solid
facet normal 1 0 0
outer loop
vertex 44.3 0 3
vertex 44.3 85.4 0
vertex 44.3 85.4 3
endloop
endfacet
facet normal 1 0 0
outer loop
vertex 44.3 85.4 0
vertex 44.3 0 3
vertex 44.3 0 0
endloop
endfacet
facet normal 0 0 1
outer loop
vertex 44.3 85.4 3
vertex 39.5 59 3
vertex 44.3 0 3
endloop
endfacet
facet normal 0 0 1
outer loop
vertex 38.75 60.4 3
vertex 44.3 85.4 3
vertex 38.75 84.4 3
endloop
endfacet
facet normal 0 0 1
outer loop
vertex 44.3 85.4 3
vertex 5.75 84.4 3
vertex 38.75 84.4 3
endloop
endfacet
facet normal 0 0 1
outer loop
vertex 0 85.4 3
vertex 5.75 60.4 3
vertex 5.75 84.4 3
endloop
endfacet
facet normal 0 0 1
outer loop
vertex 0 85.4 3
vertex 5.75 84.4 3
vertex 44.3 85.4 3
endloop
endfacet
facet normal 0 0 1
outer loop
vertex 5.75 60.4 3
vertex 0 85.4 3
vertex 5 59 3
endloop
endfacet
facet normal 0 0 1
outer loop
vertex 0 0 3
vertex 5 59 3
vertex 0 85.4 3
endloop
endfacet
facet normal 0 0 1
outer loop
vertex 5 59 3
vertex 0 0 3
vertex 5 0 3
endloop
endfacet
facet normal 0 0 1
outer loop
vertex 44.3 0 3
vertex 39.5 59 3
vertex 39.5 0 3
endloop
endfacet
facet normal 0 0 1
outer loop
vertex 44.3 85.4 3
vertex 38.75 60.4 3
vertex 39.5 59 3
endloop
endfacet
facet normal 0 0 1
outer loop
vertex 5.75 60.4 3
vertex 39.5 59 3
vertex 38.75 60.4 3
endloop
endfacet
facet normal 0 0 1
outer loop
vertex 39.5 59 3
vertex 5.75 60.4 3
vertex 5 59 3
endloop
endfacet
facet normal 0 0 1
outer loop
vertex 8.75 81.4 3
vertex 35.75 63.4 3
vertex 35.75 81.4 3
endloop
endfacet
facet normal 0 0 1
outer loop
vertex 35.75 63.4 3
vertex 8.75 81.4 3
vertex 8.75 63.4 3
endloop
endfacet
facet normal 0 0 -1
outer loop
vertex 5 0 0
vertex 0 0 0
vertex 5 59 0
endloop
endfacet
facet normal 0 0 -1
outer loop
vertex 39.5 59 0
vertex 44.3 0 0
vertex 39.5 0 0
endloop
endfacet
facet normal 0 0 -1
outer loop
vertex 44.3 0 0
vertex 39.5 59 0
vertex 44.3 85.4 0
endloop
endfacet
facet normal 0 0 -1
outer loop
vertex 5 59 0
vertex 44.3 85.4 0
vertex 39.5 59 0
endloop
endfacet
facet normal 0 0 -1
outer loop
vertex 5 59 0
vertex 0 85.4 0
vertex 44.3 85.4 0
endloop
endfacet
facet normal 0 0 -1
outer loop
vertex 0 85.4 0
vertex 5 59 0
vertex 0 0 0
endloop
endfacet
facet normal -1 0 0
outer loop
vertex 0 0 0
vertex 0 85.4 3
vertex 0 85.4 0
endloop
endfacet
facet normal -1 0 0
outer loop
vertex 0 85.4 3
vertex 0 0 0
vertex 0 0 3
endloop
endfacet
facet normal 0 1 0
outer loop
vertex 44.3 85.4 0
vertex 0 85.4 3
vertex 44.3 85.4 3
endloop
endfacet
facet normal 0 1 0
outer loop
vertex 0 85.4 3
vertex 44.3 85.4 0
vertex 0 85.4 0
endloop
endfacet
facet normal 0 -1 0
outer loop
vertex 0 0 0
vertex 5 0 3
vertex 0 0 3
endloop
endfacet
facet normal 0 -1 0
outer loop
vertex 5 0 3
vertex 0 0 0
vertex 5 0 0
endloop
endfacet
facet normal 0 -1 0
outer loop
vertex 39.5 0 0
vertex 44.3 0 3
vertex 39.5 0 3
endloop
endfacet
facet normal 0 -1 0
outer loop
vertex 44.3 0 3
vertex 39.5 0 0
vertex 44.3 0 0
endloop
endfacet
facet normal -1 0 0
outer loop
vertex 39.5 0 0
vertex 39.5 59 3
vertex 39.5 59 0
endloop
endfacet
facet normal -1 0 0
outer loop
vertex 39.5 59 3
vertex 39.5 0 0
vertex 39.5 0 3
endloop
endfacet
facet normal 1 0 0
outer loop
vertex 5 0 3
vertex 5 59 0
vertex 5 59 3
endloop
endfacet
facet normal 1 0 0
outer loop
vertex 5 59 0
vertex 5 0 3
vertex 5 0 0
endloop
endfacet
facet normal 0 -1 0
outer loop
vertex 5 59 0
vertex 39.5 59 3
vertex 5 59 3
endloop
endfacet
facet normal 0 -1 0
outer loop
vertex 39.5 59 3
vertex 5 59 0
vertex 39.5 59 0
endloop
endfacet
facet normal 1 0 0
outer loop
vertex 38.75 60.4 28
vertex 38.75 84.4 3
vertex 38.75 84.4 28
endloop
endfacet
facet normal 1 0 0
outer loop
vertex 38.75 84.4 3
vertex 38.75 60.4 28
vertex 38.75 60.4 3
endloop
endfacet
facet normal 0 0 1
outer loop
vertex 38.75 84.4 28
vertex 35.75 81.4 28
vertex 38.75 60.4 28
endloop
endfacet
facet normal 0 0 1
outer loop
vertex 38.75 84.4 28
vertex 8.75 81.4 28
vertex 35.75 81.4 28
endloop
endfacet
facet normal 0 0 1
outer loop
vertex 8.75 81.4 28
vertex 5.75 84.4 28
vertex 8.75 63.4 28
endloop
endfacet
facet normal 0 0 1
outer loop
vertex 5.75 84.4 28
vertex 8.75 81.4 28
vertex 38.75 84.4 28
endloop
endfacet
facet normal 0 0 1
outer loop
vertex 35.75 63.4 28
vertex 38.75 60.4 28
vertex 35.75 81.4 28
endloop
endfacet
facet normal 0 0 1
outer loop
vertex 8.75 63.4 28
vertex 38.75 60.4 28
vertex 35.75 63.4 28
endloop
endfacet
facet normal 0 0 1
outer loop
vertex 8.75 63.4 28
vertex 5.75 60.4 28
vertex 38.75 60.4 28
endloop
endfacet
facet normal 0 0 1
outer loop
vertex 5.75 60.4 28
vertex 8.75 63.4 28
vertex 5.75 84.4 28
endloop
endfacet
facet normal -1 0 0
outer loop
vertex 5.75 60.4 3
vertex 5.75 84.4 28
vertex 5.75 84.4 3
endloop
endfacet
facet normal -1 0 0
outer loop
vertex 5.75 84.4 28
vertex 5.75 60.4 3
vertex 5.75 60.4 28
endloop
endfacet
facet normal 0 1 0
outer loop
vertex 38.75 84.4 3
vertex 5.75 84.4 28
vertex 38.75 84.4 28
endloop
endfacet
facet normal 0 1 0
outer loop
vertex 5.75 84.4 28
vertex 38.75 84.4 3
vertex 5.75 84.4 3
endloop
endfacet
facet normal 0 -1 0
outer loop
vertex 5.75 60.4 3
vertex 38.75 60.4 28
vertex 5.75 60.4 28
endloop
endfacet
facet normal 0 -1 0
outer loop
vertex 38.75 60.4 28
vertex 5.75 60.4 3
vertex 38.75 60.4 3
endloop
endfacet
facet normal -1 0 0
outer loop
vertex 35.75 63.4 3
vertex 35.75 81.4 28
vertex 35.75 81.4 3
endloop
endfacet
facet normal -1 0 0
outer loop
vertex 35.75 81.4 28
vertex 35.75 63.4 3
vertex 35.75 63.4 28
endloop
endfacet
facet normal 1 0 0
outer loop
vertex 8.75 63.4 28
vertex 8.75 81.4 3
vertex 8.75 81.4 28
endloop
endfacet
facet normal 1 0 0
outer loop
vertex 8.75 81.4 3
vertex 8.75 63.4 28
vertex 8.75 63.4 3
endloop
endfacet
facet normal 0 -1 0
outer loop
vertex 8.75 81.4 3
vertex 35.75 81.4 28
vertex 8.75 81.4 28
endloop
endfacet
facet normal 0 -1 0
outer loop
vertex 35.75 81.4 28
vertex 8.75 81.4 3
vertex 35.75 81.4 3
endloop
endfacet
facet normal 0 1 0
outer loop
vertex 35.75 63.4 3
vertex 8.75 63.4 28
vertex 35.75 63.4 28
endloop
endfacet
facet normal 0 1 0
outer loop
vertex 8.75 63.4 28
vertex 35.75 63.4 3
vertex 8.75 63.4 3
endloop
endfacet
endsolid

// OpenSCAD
LED_STRIP_WIDTH=51+2;
LED_STRIP_HEIGHT=10.2+1;
LED_STRIP_THICK=6; // with wires attached

WHEEL_WIDTH=10.8;
WHEEL_DIA=30.15;

module strip_keepout()
{
  rotate(45,[1,0,0])
  translate([0,0, -100+LED_STRIP_HEIGHT])
  cube([LED_STRIP_WIDTH,5,100]);

  rotate(45,[1,0,0])
  translate([LED_STRIP_WIDTH/2 - 7.5, -49,0])
  cube([15,50,7]);
}

module strip_keepout2(extra_depth)
{
  cube([6+3+extra_depth, LED_STRIP_WIDTH, LED_STRIP_HEIGHT]);
}

CAR_LENGTH=177;
CAR_HEIGHT=32;
CAR_HEIGHT_MODDED=15;
CAR_WIDTH=44.5;
CAR_W_FENDERS_WIDTH=CAR_WIDTH + 2 * WHEEL_WIDTH;

AXLE_HEIGHT=2;
AXLE_FRONT_DIST=24;
AXLE_REAR_DIST=135;

TIRE_DIA=30.1;

module base_keepout()
{
  cube([CAR_LENGTH,CAR_WIDTH,CAR_HEIGHT_MODDED]);
  
  translate([AXLE_FRONT_DIST,.1,2])
  rotate(90,[1,0,0])
  cylinder(h=20, r=TIRE_DIA/2+4);
  
  translate([AXLE_REAR_DIST,.1,2])
  rotate(90,[1,0,0])
  cylinder(h=20, r=TIRE_DIA/2+4);
  
  translate([AXLE_FRONT_DIST,CAR_WIDTH+20-.1,2])
  rotate(90,[1,0,0])
  cylinder(h=20, r=TIRE_DIA/2+4);
  
  translate([AXLE_REAR_DIST,.1,2])
  rotate(90,[1,0,0])
  cylinder(h=20, r=TIRE_DIA/2+4);
  
  translate([AXLE_REAR_DIST,CAR_WIDTH+20-.1,2])
  rotate(90,[1,0,0])
  cylinder(h=20, r=TIRE_DIA/2+4);
}

WALL_THICK=3;
FEATHER_LENGTH=51;
FEATHER_WIDTH=23;
FEATHER_HEIGHT=10;
FEATHER_BOARD_ONLY_HEIGHT=1.6;

COMPUTER_BOX_HEIGHT = 2*WALL_THICK + FEATHER_WIDTH+2;


module front_body(width)
{
  
  translate([0,width,0])
  rotate(90,[1,0,0])
  translate([-40,0,0])
  linear_extrude(width)
  polygon(points=[ [0,0], 
                   [40, CAR_HEIGHT_MODDED+COMPUTER_BOX_HEIGHT], 
                   [100, CAR_HEIGHT_MODDED+COMPUTER_BOX_HEIGHT], 
                   [100, CAR_HEIGHT_MODDED], 
                   [40, CAR_HEIGHT_MODDED], 
                   [40,0]] );
  
  //polygon(points=[[0,0],[100,0],[130,50],[30,50]]);
}

module front_body_keepouts()
{
  
  translate([0,44.5-4,0])
  rotate(90,[1,0,0])
  translate([-40,0,0])
  linear_extrude(44.5-4)
  polygon(points=[ [6,3], 
                   [6,1000], 
                   [97, 1000], 
                   [97, CAR_HEIGHT_MODDED+3],
                   [85, CAR_HEIGHT_MODDED+3],
                   [85, 0],
                   [45, 0],
                   [45, CAR_HEIGHT_MODDED+3], 
                   [37, CAR_HEIGHT_MODDED+3],
                   [37,3]] );
  
}

module front_body_keepouts2()
{
  
  translate([0,CAR_W_FENDERS_WIDTH-6,0])
  rotate(90,[1,0,0])
  translate([-40,0,0])
  linear_extrude(CAR_W_FENDERS_WIDTH-6)
  polygon(points=[ [6,3], 
                   [6,1000], 
                   [97, 1000], 
                   [97, CAR_HEIGHT_MODDED+9], 
                   [37, CAR_HEIGHT_MODDED+9],
                   [37,3]] );
  
  //polygon(points=[[0,0],[100,0],[130,50],[30,50]]);
}

BATTERY_DEPTH=18;
BATTERY_WIDTH=27;
BATTERY_BOX_HEIGHT=25;
module batteryHolder()
{
  difference()
  {
    cube([CAR_WIDTH-.2, 61 + .4 +BATTERY_DEPTH + 2 * 3, 3]);
   
    translate([5, -1, -1])
    cube([CAR_WIDTH - 10, 60, 5]);
  }
  
  difference()
  {
    translate([ (CAR_WIDTH - BATTERY_WIDTH - 6)/2, 60.4, 2])
    cube([BATTERY_WIDTH+6, BATTERY_DEPTH+6, BATTERY_BOX_HEIGHT+1]);
    
    translate([ (CAR_WIDTH - BATTERY_WIDTH)/2, 63.4, 3])
    cube([BATTERY_WIDTH, BATTERY_DEPTH, BATTERY_BOX_HEIGHT+1]);
  }
}

module roof_parts(width)
{
  
  translate([0,width,0])
  rotate(90,[1,0,0])
  translate([-40,0,0])
  linear_extrude(width)
  polygon(points=[ [9,3],
                   [6,3],
                   [6,200],
                   [100,200],
                   [100,CAR_HEIGHT_MODDED+COMPUTER_BOX_HEIGHT-3],
                   [40, CAR_HEIGHT_MODDED+COMPUTER_BOX_HEIGHT-3]] );
  
  //polygon(points=[[0,0],[100,0],[130,50],[30,50]]);
}


SPEAKER_DIA = 28;


module speaker_keepout()
{
  cylinder(h=5,r=SPEAKER_DIA/2);
}

module speaker_mount()
{
  difference()
  {
    cylinder(h=5,r=SPEAKER_DIA/2+2.5);
    
    // Knock middle out
    translate([0,0,-1])
    cylinder(h=7, r=SPEAKER_DIA/2);
    
    // No ring around 1/4
    translate([0,0,-1])
      cube([SPEAKER_DIA, SPEAKER_DIA, 7]);
  }
  
  // Bottom ring to keep speaker from falling out
  difference()
  {
    cylinder(h=3, r=SPEAKER_DIA/2+1.5);
    
    translate([0,0,-1])
    cylinder(h=5, r=SPEAKER_DIA/2-2);
  }
  
  // Cross supports
  translate([-SPEAKER_DIA/2, -1.5, 0])
  cube([SPEAKER_DIA, 3, 3]);
  
  translate([-1.5,-SPEAKER_DIA/2, 0])
  cube([3,SPEAKER_DIA,3]);
}

ALIGNMENT_HOLE_RAD=2.5;

module tall_alignment_hole(height)
{
  support_width=ALIGNMENT_HOLE_RAD*2+3*2;
  
  
  difference()
  {
    translate([-support_width/2, -support_width/2, 0])
      cube([support_width,support_width, height]);
    
    translate([0,0, height-3])
    cylinder(h=3.1, r=ALIGNMENT_HOLE_RAD);
  }
} 

//speaker_mount();

ALIGNMENT_HOLE_RAD=2.5;

module front_clip()
{
  
  difference()
  {
  
    hull()
    front_body(CAR_W_FENDERS_WIDTH);
  
    translate([0,WHEEL_WIDTH+2,0])
    front_body_keepouts();
  
    translate([0,3,0])
      front_body_keepouts2();
  
    translate([0,WHEEL_WIDTH,0])
      base_keepout();
    
    translate([56, (CAR_WIDTH-40)/2 + WHEEL_WIDTH, CAR_HEIGHT_MODDED+6])
    cube([500, 40, COMPUTER_BOX_HEIGHT-5]);
  
    translate([-SPEAKER_DIA/2-3, CAR_W_FENDERS_WIDTH/2, -1])
      speaker_keepout();
    
    // Alignment holes
    translate([-28,8,-1])
    cylinder(h=5, r=ALIGNMENT_HOLE_RAD);
    
    // Alignment holes
    translate([-28,CAR_W_FENDERS_WIDTH-8,-1])
    cylinder(h=5, r=ALIGNMENT_HOLE_RAD);
    
    // Fastener hole
    translate([1, WHEEL_WIDTH + CAR_WIDTH/2, 10])
    rotate(90,[0,-1,0])
    cylinder(h=5, r=ALIGNMENT_HOLE_RAD);
    
    // 
  }
  
  translate([52,CAR_W_FENDERS_WIDTH-7.3,CAR_HEIGHT_MODDED])
    tall_alignment_hole(COMPUTER_BOX_HEIGHT-3);
  
  translate([52,7.3,CAR_HEIGHT_MODDED])
    tall_alignment_hole(COMPUTER_BOX_HEIGHT-3);
  
  translate([-SPEAKER_DIA/2-3, CAR_W_FENDERS_WIDTH/2, 0])
    rotate(135, [0,0,1])
      speaker_mount();
}

// Creates a #3 Logo
module graphicLogo(xSize, ySize, zSize)
{
  resize([xSize,ySize,zSize])
  intersection()
  {
    translate([0,0,50])
      surface(file="car_number.png", invert=true);
  }

}

// This is the whole roof (original design), but it wastes lots of filament
// when printed with required supports
module roof(width)
{
  difference()
  {
    intersection()
    {
    front_body(CAR_W_FENDERS_WIDTH);
    
    translate([0,3,0])
    roof_parts(width);
    }
  
    window_width = (CAR_W_FENDERS_WIDTH - 6 - 6 - 3) / 2;
    window_height = COMPUTER_BOX_HEIGHT - 12;
    
    translate([-40, 6, CAR_HEIGHT_MODDED+6])
    cube([40, window_width, window_height]);
    
    translate([-40, 9 + window_width, CAR_HEIGHT_MODDED+6])
    cube([40, window_width, window_height]);
    
    translate([-35, CAR_W_FENDERS_WIDTH/2 - 30/2, -2])
    rotate(42,[0,-1,0])
    cube([20, 30, 5]);
    
    translate([52,CAR_W_FENDERS_WIDTH-7.3,CAR_HEIGHT_MODDED+COMPUTER_BOX_HEIGHT-3.1])
    cylinder(h=2, r=ALIGNMENT_HOLE_RAD-.1);
  
  translate([52,7.3,CAR_HEIGHT_MODDED+COMPUTER_BOX_HEIGHT-3.1])
    cylinder(h=2, r=ALIGNMENT_HOLE_RAD-.1);

  }

  // Alignment holes
  translate([-28,8,0])
    cylinder(h=10, r=ALIGNMENT_HOLE_RAD-.1);
  
  // Alignment holes
  translate([-28,CAR_W_FENDERS_WIDTH-8,0])
    cylinder(h=10, r=ALIGNMENT_HOLE_RAD-.1);
  
  // Joining surface
  translate([-2, 3, CAR_HEIGHT_MODDED+COMPUTER_BOX_HEIGHT-5.9])
  cube([4, CAR_W_FENDERS_WIDTH-6, 3]);
  
  // scanner shelf
  translate([-30, CAR_W_FENDERS_WIDTH - 16, CAR_HEIGHT_MODDED-7])
  cube([15, 13, 3]);
  
  // scanner shelf
  translate([-30, 3, CAR_HEIGHT_MODDED-7])
  cube([15, 13, 3]);
  
  translate([4,14, CAR_HEIGHT_MODDED+COMPUTER_BOX_HEIGHT])
    graphicLogo(50, CAR_W_FENDERS_WIDTH - 6 - 2 * WHEEL_WIDTH, 3);
}


//roof(CAR_W_FENDERS_WIDTH-6);

module roof1()
{
  difference()
  {
    roof(CAR_W_FENDERS_WIDTH-6);
    
    translate([0, 0, CAR_HEIGHT_MODDED+COMPUTER_BOX_HEIGHT-3.1])
    cube([200, 200, 200]);
  }
}

module roof2()
{
  intersection()
  {
    roof(CAR_W_FENDERS_WIDTH-6);
    
    translate([0, 0, CAR_HEIGHT_MODDED+COMPUTER_BOX_HEIGHT-3.1])
    cube([57, 200, 200]);
  }
  
}

module roof3()
{
  difference()
  {
    roof2();
    
    translate([-3,0,0])
    cube([5,100, 100]);
    
    
    cube([200,3.1,100]);
    
    translate([0,CAR_W_FENDERS_WIDTH - 3.1,100])
    cube([200,3.1,100]);
    
    translate([56.9,0,0])
    cube([100, 100, 200]);
  }
  
}
  
module roofExtender(height)
{
  difference()
  {
    translate([-3,0,0])
    cube([63, CAR_W_FENDERS_WIDTH, height]);
    
    translate([3,3,-1])
    cube([60-6, CAR_W_FENDERS_WIDTH - 6, height+2]);
    
    translate([0, 3, height-3])
    cube([4,CAR_W_FENDERS_WIDTH - 6, 4]);
  }
  
  translate([0,3,-3])
  cube([1.8, CAR_W_FENDERS_WIDTH - 6, height+3.1]);
  
  difference()
  {
    union()
    {
      translate([52,CAR_W_FENDERS_WIDTH-7.3,-3])
        tall_alignment_hole(height);
  
      translate([52,7.3,-3])
        tall_alignment_hole(height);
    }
    
    translate([57,-1,-4])
    cube([100,CAR_W_FENDERS_WIDTH+2, 4]);
    
    translate([40, -1, -4])
    cube([20,4,4]);
    
    translate([40, CAR_W_FENDERS_WIDTH - 3, -4])
    cube([20,4,4]);
  }
  
  translate([0, 2, height-6])
  cube([6, 4, 3]);
  
  translate([0, CAR_W_FENDERS_WIDTH - 6, height-6])
  cube([6, 4, 3]);
  
  // Alignment holes
  translate([52,7.3,-5])
    cylinder(h=height+4, r=ALIGNMENT_HOLE_RAD-.1);  
  translate([52,7.3,height-5])
    cylinder(h=2, r=ALIGNMENT_HOLE_RAD+.1);
  
  // Alignment holes
  translate([52,CAR_W_FENDERS_WIDTH-7.3,-5])
    cylinder(h=height+4, r=ALIGNMENT_HOLE_RAD-.1);  
  translate([52,CAR_W_FENDERS_WIDTH-7.3,height-5])
    cylinder(h=2, r=ALIGNMENT_HOLE_RAD+.1);
        
  //translate([5,3, - COMPUTER_BOX_HEIGHT + 9])
  //cube([3,2, COMPUTER_BOX_HEIGHT + height -9 -3]);
}

// Uncomment each one to render each of the pieces
//roof(CAR_W_FENDERS_WIDTH-6);
// roof1();
// roof2();
// front_clip();
//roofExtender(6);
// roof3();
batteryHolder();


$fn=500;
